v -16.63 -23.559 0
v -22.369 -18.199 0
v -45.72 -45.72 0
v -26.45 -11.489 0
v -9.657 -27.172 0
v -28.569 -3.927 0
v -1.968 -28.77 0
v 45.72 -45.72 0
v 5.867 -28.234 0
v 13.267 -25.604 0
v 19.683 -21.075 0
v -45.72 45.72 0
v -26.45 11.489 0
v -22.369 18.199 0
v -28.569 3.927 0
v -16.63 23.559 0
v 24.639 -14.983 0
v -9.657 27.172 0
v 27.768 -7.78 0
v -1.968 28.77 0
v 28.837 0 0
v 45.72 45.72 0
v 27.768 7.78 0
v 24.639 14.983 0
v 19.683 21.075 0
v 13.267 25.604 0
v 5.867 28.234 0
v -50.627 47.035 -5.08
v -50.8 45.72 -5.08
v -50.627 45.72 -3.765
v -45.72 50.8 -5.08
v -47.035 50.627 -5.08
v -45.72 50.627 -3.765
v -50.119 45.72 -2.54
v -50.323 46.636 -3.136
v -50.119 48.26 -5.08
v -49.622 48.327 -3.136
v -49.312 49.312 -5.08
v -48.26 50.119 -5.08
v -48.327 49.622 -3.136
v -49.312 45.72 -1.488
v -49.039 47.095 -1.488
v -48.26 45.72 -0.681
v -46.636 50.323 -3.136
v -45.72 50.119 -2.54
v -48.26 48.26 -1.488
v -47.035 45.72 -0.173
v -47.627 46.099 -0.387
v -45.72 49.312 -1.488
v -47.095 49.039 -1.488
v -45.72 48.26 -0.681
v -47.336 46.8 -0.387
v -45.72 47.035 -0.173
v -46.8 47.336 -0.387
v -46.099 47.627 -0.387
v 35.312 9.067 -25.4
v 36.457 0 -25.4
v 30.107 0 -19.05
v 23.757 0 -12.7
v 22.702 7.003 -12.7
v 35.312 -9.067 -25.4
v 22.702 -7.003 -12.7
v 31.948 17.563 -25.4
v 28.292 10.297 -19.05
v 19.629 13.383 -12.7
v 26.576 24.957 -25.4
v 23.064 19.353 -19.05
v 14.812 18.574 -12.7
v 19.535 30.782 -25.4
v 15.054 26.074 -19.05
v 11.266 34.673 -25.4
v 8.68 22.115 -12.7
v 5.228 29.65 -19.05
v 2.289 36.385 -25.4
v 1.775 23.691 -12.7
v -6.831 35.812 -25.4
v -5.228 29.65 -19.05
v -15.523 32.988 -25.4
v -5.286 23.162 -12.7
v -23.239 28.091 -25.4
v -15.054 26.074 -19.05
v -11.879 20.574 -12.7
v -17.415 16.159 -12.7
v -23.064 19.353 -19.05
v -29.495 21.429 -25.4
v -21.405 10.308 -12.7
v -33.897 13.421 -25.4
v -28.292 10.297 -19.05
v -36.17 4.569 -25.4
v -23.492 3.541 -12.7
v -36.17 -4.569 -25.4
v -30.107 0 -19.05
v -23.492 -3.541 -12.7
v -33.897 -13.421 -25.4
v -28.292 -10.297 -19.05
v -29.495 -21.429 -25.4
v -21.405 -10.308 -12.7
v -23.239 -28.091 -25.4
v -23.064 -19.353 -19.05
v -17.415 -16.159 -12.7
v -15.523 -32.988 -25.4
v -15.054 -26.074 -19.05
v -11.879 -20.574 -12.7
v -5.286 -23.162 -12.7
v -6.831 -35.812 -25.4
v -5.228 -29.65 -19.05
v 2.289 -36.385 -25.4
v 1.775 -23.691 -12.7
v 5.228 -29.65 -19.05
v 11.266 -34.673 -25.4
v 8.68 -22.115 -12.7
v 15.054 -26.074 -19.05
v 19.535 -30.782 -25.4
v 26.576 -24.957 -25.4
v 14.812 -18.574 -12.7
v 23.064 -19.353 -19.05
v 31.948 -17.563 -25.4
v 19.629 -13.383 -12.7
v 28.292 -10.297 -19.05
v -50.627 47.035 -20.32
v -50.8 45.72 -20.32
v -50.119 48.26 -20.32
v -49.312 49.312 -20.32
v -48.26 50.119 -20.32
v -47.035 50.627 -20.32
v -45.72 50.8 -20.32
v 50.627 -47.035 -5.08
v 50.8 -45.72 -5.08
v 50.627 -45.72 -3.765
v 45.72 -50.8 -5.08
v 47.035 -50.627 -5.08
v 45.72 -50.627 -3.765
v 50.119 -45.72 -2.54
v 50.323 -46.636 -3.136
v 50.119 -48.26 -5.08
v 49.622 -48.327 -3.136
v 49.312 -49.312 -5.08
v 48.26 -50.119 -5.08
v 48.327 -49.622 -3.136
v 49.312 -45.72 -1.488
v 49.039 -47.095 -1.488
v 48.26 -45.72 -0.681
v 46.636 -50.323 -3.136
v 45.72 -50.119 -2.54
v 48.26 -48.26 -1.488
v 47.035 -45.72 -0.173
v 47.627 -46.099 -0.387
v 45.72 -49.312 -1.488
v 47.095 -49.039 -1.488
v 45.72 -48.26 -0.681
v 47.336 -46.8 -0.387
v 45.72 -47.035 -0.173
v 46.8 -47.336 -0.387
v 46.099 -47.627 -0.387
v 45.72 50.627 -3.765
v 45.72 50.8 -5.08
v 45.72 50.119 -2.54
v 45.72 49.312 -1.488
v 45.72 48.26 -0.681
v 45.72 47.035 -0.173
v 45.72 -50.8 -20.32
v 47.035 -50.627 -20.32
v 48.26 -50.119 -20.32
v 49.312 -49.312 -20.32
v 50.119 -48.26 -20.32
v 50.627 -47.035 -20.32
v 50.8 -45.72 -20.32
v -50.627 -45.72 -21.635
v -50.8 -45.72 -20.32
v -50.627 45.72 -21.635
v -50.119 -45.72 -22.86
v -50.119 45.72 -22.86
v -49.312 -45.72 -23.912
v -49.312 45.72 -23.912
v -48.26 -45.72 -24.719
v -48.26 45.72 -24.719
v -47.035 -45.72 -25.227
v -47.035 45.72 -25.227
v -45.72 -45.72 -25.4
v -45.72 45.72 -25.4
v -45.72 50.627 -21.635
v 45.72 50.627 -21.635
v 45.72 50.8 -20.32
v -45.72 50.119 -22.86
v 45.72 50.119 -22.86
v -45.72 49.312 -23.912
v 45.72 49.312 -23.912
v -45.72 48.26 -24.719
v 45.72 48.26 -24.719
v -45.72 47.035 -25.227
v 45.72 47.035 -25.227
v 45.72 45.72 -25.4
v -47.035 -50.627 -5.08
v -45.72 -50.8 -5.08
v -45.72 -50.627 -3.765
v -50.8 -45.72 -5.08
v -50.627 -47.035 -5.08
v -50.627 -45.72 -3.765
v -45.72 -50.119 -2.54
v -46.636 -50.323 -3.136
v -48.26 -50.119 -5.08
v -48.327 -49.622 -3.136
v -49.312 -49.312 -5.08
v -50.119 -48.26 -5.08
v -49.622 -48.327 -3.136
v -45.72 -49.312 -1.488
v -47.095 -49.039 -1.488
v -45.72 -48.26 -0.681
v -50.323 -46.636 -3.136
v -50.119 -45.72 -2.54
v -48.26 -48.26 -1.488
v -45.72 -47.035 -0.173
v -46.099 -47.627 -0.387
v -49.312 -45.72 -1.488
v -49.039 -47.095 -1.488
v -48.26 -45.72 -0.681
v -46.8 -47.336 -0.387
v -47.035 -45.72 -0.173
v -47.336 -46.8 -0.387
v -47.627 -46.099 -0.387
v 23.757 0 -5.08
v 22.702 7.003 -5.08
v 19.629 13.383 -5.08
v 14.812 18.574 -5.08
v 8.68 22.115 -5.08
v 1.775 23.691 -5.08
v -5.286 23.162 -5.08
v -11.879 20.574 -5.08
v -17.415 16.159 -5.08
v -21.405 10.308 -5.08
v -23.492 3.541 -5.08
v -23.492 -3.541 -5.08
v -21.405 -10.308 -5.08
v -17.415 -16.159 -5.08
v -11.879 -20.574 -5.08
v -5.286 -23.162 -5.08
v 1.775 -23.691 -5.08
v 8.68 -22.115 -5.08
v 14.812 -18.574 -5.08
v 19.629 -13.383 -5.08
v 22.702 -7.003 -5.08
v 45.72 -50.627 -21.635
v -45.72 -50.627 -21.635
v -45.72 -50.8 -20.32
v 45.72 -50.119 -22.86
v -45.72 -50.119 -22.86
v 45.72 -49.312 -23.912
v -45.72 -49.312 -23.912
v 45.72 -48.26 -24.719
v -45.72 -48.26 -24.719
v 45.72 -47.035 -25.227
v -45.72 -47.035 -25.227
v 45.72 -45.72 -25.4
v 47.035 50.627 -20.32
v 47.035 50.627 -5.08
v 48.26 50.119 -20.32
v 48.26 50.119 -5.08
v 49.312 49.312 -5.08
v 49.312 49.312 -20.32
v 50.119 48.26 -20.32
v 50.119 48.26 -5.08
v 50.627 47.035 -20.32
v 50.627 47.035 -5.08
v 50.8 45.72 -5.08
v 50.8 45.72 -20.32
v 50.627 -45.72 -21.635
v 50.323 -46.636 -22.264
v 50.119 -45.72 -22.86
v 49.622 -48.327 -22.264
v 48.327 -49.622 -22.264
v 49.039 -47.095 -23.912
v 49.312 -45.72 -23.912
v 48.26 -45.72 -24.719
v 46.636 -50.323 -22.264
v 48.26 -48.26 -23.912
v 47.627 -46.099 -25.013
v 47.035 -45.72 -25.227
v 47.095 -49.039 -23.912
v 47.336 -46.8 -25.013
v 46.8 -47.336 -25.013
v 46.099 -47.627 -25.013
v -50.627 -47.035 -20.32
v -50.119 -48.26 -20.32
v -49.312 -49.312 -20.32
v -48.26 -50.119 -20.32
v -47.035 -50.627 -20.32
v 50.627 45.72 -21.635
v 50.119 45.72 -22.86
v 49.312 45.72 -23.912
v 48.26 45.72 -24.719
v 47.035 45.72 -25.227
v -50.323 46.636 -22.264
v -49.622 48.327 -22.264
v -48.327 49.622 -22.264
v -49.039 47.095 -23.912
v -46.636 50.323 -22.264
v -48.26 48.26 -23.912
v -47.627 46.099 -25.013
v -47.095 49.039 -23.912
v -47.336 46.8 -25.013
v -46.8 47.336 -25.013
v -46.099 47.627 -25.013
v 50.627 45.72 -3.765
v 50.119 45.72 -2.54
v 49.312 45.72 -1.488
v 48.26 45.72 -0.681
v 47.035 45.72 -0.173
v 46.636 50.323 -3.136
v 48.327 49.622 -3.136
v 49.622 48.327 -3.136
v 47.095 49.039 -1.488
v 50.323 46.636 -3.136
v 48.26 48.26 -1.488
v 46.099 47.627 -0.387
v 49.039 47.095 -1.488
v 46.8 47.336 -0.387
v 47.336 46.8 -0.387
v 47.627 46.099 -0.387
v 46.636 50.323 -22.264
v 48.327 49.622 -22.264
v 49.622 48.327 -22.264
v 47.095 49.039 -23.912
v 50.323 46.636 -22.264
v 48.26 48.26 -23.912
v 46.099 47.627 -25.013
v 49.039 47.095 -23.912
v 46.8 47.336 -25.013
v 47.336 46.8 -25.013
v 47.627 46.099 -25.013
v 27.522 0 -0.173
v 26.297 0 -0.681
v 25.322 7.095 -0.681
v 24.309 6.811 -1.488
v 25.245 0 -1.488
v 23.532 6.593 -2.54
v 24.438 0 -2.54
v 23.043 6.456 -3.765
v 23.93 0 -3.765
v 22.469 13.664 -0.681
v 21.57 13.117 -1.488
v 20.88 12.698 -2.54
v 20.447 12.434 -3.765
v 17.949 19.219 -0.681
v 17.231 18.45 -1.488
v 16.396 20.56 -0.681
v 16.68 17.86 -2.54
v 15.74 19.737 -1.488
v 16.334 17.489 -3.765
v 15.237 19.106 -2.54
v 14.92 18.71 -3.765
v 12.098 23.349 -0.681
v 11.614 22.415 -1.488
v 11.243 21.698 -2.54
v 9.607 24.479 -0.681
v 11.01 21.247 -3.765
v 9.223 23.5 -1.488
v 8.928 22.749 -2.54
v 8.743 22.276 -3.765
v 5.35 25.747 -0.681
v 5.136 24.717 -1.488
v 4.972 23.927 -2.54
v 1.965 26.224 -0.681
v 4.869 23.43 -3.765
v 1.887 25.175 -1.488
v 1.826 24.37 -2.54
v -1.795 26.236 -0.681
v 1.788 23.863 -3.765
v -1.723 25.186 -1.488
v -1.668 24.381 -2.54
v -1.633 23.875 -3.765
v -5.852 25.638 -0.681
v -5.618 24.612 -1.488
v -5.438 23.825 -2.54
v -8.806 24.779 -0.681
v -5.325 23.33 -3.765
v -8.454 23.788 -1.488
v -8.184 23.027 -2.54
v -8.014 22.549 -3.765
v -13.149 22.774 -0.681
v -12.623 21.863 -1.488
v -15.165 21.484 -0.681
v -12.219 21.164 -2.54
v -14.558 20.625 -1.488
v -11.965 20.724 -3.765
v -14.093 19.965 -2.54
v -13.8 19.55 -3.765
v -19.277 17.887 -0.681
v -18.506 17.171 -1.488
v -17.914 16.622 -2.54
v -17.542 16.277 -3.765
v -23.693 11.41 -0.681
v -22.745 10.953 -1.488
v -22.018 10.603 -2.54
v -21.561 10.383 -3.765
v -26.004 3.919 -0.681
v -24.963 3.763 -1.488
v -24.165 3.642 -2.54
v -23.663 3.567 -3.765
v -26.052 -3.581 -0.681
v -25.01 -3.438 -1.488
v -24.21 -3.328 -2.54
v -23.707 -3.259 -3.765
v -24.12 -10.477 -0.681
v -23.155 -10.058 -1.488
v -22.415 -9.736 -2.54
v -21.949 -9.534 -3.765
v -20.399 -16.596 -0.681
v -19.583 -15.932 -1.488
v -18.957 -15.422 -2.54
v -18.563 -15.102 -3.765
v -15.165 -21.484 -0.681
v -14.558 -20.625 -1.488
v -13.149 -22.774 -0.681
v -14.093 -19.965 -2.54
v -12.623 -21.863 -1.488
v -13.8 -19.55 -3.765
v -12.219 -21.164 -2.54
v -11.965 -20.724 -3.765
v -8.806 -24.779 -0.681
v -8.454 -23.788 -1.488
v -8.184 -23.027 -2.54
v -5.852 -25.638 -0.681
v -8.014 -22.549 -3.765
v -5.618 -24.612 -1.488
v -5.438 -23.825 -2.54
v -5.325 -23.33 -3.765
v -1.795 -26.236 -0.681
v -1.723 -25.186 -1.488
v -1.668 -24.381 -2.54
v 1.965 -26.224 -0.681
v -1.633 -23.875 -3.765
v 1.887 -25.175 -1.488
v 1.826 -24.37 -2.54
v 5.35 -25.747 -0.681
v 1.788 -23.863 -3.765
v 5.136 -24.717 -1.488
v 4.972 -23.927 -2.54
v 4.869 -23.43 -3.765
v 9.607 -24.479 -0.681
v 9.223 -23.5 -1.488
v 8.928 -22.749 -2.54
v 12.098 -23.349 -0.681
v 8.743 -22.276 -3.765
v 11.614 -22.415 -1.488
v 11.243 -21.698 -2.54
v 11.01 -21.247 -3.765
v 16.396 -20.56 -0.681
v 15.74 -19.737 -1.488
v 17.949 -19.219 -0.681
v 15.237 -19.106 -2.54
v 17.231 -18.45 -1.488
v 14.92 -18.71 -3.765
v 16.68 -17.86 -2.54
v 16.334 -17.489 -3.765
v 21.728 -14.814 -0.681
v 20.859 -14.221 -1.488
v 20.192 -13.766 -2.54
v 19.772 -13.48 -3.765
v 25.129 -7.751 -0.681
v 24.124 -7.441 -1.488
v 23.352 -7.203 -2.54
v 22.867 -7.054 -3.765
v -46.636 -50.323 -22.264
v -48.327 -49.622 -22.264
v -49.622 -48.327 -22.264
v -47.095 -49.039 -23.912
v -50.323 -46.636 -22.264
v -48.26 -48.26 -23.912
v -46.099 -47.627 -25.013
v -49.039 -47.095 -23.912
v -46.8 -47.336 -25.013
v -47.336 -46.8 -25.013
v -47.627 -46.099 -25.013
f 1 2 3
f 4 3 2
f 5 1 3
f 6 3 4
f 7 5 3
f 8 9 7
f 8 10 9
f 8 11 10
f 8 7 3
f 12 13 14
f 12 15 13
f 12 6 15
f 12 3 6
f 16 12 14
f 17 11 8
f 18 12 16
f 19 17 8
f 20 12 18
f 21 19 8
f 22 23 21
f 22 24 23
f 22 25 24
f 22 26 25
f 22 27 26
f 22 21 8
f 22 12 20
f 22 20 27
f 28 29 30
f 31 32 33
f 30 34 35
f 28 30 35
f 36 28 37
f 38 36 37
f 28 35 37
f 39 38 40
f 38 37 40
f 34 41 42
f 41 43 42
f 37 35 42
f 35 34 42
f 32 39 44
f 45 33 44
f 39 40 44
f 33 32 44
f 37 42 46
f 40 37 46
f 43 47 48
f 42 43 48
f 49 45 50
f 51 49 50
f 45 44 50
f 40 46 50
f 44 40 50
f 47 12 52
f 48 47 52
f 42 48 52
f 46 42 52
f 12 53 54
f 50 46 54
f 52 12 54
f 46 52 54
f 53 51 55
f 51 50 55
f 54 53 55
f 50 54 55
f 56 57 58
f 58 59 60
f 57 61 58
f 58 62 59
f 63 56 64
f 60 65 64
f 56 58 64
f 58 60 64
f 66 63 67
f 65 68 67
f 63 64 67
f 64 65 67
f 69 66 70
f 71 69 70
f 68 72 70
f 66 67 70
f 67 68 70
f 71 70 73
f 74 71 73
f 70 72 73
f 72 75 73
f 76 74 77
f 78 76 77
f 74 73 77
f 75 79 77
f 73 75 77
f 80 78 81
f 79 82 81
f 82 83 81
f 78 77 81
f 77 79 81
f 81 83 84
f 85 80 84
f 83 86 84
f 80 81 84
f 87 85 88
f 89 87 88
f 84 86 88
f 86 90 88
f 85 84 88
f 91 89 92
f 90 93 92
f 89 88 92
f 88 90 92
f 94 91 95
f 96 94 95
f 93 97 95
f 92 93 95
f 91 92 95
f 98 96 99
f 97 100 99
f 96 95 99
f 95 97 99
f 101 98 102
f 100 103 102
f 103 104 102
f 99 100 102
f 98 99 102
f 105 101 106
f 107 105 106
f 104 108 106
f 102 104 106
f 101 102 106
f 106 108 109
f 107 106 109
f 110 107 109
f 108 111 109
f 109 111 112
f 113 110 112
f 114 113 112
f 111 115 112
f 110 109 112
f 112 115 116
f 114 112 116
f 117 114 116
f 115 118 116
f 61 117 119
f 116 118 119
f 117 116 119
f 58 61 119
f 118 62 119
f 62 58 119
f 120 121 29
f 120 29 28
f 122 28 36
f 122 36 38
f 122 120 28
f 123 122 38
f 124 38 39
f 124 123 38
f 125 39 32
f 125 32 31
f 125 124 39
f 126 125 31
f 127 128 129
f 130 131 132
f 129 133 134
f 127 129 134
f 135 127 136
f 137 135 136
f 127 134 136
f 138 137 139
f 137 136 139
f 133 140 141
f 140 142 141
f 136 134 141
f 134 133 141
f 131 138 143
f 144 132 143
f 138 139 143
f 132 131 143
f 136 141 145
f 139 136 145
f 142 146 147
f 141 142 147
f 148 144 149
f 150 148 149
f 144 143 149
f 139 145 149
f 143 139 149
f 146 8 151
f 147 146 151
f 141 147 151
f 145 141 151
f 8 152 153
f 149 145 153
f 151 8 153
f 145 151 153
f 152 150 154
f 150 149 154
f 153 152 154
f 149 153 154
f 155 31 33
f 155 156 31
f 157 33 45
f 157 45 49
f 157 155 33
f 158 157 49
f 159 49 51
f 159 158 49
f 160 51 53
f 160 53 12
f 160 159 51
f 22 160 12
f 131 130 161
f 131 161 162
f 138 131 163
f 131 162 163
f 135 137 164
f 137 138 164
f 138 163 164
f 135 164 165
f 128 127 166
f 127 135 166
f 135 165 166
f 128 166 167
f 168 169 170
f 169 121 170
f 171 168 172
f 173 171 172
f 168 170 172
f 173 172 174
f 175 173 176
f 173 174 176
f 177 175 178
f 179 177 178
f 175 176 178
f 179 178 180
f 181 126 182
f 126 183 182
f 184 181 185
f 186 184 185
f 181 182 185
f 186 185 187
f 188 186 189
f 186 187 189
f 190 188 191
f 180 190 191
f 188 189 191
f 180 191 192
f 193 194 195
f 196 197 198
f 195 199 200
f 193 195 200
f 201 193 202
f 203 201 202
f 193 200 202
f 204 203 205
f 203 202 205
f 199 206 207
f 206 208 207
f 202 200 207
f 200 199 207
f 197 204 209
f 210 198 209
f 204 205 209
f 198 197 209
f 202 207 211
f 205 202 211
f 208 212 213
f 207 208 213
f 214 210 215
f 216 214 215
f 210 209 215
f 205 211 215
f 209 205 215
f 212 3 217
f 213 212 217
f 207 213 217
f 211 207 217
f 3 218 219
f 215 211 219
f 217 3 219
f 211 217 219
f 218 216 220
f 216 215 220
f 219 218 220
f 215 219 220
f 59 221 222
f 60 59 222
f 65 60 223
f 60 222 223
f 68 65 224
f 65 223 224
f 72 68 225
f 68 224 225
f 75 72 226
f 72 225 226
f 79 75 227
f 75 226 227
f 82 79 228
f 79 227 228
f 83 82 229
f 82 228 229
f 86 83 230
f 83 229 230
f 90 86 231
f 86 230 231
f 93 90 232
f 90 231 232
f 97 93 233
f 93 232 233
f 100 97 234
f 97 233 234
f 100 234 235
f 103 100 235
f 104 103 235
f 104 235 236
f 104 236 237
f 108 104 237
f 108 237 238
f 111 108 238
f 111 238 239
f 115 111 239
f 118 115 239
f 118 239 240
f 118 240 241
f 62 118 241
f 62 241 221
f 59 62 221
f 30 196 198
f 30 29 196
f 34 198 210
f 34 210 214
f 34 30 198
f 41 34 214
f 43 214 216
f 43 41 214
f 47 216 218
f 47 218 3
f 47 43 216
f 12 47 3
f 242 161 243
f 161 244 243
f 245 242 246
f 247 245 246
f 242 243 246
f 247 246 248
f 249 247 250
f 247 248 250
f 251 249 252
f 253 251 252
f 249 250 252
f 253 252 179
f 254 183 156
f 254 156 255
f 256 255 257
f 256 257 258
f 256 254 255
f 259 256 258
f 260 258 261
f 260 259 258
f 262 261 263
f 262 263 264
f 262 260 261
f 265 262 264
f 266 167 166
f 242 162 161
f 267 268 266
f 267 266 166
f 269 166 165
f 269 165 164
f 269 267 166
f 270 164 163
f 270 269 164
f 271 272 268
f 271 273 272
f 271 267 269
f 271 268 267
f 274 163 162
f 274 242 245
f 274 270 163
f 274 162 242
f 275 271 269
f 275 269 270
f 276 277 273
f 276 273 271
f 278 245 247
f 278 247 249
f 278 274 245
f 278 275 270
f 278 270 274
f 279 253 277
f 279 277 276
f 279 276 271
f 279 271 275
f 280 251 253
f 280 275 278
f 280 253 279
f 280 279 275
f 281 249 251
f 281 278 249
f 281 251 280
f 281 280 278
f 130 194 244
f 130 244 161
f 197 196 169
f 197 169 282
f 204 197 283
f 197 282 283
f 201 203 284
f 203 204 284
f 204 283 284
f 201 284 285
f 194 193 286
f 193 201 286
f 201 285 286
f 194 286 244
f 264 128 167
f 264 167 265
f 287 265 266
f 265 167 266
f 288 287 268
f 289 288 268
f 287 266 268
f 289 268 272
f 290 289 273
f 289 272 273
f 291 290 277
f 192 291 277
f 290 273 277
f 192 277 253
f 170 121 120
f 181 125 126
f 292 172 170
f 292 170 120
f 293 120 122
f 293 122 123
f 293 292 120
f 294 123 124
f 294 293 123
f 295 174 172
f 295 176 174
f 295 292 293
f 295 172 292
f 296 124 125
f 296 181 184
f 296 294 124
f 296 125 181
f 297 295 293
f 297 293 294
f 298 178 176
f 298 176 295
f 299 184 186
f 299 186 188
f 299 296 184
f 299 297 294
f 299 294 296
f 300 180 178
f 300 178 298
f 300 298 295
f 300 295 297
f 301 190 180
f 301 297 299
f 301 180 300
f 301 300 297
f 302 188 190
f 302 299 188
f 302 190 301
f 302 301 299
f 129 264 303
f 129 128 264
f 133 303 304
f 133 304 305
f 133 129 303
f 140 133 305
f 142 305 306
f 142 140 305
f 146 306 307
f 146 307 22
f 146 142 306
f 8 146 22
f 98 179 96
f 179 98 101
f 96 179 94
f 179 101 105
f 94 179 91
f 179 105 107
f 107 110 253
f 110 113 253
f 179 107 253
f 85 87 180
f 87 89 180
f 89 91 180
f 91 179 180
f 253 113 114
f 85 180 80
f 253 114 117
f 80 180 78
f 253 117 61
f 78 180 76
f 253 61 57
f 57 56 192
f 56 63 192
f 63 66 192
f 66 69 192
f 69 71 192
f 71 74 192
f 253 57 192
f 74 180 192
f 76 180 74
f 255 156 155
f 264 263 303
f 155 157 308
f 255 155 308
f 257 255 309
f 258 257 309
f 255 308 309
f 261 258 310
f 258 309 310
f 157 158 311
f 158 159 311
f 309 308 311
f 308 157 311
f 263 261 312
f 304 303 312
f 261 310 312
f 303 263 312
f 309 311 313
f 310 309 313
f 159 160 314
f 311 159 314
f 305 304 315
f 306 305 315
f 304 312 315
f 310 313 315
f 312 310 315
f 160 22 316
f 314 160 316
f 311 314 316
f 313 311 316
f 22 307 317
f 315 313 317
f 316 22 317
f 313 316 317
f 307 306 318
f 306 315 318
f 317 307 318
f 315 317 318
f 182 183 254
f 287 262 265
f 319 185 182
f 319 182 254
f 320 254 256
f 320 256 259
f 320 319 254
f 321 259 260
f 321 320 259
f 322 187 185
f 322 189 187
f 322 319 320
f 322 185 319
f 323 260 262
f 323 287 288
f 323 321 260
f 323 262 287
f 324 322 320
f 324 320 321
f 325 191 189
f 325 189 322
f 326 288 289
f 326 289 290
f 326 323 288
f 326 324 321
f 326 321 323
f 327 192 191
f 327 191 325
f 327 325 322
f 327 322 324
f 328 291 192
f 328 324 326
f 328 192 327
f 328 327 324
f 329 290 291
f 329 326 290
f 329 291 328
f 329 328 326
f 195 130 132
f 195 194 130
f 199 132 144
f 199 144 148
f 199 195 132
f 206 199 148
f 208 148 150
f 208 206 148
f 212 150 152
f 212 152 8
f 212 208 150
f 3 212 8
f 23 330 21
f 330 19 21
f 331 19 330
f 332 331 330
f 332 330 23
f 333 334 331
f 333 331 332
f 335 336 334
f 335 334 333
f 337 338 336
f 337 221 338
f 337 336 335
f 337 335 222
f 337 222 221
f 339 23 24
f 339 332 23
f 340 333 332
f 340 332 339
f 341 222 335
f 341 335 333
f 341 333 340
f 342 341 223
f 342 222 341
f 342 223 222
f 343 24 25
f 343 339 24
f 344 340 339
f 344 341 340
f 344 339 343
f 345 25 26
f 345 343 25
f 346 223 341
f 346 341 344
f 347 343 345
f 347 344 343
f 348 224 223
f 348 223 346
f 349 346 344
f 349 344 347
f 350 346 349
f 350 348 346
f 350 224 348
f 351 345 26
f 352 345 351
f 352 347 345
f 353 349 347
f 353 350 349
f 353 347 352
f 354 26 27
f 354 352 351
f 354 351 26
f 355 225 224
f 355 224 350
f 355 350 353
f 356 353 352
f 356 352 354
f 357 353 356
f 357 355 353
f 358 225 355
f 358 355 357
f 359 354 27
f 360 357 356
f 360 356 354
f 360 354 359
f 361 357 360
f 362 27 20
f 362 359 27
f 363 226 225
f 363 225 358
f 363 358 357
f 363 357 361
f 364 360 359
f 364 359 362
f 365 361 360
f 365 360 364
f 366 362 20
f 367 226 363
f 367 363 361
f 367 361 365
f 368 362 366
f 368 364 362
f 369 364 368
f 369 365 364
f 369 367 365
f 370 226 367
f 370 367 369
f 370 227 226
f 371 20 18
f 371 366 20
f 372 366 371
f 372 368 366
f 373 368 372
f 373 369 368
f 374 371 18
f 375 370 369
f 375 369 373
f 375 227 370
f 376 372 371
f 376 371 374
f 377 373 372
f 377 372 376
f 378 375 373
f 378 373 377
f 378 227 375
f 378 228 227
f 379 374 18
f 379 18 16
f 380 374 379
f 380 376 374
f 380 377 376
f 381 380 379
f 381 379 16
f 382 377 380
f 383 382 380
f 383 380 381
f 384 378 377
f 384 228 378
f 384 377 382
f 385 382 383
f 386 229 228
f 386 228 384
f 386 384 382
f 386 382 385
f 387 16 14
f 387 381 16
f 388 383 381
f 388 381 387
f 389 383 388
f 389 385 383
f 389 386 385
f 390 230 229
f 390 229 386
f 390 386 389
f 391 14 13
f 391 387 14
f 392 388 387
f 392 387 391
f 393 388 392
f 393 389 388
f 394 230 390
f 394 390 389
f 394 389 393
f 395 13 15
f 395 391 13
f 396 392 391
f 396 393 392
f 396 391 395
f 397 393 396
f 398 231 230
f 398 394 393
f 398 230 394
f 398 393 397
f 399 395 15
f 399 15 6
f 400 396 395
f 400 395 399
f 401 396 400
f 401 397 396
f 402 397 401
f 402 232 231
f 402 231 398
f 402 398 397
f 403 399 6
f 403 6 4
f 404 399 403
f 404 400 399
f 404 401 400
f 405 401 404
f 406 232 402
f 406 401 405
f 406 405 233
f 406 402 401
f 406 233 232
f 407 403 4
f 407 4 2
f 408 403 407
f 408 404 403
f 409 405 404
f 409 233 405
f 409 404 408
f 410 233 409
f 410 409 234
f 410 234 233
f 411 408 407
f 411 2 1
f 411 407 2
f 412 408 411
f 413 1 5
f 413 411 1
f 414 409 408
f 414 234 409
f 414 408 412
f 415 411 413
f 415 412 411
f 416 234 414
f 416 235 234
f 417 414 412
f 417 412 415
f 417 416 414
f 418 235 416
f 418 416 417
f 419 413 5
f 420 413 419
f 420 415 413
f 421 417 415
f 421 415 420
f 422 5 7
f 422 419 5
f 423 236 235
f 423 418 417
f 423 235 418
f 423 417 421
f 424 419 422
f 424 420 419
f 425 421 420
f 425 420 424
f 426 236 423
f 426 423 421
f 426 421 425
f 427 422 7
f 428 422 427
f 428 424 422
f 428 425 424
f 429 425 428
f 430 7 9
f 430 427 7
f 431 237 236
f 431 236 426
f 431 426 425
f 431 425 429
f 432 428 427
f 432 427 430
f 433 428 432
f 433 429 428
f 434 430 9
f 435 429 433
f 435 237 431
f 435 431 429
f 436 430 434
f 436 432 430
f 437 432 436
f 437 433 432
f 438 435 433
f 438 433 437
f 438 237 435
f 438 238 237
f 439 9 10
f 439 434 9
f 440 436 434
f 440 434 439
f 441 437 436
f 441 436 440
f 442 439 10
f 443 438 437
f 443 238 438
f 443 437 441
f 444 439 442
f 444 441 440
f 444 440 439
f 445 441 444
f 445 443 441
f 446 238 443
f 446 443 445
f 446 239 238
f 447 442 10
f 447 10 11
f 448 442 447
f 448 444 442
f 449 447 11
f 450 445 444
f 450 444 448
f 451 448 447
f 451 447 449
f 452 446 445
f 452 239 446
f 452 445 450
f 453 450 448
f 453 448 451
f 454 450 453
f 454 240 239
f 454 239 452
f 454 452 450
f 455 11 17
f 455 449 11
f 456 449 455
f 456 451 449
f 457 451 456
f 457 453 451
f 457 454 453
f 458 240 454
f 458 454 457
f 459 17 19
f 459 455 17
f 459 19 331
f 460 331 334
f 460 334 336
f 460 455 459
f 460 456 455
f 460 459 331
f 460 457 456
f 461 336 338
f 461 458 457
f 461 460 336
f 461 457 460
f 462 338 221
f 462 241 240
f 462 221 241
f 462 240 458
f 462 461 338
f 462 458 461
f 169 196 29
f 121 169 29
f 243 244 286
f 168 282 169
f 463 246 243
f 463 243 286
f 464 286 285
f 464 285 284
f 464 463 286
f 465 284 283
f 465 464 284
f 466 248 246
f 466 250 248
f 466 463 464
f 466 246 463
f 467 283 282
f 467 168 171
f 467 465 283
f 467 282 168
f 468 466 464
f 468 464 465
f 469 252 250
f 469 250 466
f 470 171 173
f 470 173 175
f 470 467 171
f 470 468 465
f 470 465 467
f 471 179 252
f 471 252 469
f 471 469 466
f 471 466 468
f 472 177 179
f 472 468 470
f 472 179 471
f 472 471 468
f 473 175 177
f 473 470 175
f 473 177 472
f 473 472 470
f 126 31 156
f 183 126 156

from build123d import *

# Parameters (mm, degrees)
F0_W     = 101.6
F0_H     = 101.6
F1_DEPTH = 25.4
F2_R     = 23.7572647181
F3_DEPTH = 25.401
F4_R     = 5.08
F5_R     = 5.08
F6_SIZE  = 12.7


with BuildPart() as f1:
    # F0 (on Top) → F1 (new body)
    with BuildSketch(Plane.XY):
        Rectangle(F0_W, F0_H)
    extrude(amount=-F1_DEPTH)

    # F2 (on face) → F3 (cut, through all)
    with BuildSketch(Plane.XY):
        Circle(F2_R)
    extrude(amount=-F3_DEPTH, mode=Mode.SUBTRACT)

    # F4
    f4_edges = [f1.edges().sort_by_distance(p)[0] for p in [
        (50.8, -50.8, -12.7),
        (-50.8, -50.8, -12.7),
        (50.8, 50.8, -12.7),
        (-23.757265, 0, 0),
        (-50.8, 50.8, -12.7),
    ]]
    fillet(f4_edges, radius=F4_R)

    # F5
    f5_edges = [f1.edges().sort_by_distance(p)[0] for p in [
        (-50.8, 0, 0),
        (-50.8, 45.72, -12.7),
        (-50.8, -45.72, -12.7),
        (-50.8, 0, -25.4),
    ]]
    fillet(f5_edges, radius=F5_R)

    # F6
    f6_edges = [f1.edges().sort_by_distance(p)[0] for p in [
        (-23.757265, 0, -25.4),
        (-23.757265, 0, -5.08),
    ]]
    chamfer(f6_edges, length=F6_SIZE)


solid = f1.part
